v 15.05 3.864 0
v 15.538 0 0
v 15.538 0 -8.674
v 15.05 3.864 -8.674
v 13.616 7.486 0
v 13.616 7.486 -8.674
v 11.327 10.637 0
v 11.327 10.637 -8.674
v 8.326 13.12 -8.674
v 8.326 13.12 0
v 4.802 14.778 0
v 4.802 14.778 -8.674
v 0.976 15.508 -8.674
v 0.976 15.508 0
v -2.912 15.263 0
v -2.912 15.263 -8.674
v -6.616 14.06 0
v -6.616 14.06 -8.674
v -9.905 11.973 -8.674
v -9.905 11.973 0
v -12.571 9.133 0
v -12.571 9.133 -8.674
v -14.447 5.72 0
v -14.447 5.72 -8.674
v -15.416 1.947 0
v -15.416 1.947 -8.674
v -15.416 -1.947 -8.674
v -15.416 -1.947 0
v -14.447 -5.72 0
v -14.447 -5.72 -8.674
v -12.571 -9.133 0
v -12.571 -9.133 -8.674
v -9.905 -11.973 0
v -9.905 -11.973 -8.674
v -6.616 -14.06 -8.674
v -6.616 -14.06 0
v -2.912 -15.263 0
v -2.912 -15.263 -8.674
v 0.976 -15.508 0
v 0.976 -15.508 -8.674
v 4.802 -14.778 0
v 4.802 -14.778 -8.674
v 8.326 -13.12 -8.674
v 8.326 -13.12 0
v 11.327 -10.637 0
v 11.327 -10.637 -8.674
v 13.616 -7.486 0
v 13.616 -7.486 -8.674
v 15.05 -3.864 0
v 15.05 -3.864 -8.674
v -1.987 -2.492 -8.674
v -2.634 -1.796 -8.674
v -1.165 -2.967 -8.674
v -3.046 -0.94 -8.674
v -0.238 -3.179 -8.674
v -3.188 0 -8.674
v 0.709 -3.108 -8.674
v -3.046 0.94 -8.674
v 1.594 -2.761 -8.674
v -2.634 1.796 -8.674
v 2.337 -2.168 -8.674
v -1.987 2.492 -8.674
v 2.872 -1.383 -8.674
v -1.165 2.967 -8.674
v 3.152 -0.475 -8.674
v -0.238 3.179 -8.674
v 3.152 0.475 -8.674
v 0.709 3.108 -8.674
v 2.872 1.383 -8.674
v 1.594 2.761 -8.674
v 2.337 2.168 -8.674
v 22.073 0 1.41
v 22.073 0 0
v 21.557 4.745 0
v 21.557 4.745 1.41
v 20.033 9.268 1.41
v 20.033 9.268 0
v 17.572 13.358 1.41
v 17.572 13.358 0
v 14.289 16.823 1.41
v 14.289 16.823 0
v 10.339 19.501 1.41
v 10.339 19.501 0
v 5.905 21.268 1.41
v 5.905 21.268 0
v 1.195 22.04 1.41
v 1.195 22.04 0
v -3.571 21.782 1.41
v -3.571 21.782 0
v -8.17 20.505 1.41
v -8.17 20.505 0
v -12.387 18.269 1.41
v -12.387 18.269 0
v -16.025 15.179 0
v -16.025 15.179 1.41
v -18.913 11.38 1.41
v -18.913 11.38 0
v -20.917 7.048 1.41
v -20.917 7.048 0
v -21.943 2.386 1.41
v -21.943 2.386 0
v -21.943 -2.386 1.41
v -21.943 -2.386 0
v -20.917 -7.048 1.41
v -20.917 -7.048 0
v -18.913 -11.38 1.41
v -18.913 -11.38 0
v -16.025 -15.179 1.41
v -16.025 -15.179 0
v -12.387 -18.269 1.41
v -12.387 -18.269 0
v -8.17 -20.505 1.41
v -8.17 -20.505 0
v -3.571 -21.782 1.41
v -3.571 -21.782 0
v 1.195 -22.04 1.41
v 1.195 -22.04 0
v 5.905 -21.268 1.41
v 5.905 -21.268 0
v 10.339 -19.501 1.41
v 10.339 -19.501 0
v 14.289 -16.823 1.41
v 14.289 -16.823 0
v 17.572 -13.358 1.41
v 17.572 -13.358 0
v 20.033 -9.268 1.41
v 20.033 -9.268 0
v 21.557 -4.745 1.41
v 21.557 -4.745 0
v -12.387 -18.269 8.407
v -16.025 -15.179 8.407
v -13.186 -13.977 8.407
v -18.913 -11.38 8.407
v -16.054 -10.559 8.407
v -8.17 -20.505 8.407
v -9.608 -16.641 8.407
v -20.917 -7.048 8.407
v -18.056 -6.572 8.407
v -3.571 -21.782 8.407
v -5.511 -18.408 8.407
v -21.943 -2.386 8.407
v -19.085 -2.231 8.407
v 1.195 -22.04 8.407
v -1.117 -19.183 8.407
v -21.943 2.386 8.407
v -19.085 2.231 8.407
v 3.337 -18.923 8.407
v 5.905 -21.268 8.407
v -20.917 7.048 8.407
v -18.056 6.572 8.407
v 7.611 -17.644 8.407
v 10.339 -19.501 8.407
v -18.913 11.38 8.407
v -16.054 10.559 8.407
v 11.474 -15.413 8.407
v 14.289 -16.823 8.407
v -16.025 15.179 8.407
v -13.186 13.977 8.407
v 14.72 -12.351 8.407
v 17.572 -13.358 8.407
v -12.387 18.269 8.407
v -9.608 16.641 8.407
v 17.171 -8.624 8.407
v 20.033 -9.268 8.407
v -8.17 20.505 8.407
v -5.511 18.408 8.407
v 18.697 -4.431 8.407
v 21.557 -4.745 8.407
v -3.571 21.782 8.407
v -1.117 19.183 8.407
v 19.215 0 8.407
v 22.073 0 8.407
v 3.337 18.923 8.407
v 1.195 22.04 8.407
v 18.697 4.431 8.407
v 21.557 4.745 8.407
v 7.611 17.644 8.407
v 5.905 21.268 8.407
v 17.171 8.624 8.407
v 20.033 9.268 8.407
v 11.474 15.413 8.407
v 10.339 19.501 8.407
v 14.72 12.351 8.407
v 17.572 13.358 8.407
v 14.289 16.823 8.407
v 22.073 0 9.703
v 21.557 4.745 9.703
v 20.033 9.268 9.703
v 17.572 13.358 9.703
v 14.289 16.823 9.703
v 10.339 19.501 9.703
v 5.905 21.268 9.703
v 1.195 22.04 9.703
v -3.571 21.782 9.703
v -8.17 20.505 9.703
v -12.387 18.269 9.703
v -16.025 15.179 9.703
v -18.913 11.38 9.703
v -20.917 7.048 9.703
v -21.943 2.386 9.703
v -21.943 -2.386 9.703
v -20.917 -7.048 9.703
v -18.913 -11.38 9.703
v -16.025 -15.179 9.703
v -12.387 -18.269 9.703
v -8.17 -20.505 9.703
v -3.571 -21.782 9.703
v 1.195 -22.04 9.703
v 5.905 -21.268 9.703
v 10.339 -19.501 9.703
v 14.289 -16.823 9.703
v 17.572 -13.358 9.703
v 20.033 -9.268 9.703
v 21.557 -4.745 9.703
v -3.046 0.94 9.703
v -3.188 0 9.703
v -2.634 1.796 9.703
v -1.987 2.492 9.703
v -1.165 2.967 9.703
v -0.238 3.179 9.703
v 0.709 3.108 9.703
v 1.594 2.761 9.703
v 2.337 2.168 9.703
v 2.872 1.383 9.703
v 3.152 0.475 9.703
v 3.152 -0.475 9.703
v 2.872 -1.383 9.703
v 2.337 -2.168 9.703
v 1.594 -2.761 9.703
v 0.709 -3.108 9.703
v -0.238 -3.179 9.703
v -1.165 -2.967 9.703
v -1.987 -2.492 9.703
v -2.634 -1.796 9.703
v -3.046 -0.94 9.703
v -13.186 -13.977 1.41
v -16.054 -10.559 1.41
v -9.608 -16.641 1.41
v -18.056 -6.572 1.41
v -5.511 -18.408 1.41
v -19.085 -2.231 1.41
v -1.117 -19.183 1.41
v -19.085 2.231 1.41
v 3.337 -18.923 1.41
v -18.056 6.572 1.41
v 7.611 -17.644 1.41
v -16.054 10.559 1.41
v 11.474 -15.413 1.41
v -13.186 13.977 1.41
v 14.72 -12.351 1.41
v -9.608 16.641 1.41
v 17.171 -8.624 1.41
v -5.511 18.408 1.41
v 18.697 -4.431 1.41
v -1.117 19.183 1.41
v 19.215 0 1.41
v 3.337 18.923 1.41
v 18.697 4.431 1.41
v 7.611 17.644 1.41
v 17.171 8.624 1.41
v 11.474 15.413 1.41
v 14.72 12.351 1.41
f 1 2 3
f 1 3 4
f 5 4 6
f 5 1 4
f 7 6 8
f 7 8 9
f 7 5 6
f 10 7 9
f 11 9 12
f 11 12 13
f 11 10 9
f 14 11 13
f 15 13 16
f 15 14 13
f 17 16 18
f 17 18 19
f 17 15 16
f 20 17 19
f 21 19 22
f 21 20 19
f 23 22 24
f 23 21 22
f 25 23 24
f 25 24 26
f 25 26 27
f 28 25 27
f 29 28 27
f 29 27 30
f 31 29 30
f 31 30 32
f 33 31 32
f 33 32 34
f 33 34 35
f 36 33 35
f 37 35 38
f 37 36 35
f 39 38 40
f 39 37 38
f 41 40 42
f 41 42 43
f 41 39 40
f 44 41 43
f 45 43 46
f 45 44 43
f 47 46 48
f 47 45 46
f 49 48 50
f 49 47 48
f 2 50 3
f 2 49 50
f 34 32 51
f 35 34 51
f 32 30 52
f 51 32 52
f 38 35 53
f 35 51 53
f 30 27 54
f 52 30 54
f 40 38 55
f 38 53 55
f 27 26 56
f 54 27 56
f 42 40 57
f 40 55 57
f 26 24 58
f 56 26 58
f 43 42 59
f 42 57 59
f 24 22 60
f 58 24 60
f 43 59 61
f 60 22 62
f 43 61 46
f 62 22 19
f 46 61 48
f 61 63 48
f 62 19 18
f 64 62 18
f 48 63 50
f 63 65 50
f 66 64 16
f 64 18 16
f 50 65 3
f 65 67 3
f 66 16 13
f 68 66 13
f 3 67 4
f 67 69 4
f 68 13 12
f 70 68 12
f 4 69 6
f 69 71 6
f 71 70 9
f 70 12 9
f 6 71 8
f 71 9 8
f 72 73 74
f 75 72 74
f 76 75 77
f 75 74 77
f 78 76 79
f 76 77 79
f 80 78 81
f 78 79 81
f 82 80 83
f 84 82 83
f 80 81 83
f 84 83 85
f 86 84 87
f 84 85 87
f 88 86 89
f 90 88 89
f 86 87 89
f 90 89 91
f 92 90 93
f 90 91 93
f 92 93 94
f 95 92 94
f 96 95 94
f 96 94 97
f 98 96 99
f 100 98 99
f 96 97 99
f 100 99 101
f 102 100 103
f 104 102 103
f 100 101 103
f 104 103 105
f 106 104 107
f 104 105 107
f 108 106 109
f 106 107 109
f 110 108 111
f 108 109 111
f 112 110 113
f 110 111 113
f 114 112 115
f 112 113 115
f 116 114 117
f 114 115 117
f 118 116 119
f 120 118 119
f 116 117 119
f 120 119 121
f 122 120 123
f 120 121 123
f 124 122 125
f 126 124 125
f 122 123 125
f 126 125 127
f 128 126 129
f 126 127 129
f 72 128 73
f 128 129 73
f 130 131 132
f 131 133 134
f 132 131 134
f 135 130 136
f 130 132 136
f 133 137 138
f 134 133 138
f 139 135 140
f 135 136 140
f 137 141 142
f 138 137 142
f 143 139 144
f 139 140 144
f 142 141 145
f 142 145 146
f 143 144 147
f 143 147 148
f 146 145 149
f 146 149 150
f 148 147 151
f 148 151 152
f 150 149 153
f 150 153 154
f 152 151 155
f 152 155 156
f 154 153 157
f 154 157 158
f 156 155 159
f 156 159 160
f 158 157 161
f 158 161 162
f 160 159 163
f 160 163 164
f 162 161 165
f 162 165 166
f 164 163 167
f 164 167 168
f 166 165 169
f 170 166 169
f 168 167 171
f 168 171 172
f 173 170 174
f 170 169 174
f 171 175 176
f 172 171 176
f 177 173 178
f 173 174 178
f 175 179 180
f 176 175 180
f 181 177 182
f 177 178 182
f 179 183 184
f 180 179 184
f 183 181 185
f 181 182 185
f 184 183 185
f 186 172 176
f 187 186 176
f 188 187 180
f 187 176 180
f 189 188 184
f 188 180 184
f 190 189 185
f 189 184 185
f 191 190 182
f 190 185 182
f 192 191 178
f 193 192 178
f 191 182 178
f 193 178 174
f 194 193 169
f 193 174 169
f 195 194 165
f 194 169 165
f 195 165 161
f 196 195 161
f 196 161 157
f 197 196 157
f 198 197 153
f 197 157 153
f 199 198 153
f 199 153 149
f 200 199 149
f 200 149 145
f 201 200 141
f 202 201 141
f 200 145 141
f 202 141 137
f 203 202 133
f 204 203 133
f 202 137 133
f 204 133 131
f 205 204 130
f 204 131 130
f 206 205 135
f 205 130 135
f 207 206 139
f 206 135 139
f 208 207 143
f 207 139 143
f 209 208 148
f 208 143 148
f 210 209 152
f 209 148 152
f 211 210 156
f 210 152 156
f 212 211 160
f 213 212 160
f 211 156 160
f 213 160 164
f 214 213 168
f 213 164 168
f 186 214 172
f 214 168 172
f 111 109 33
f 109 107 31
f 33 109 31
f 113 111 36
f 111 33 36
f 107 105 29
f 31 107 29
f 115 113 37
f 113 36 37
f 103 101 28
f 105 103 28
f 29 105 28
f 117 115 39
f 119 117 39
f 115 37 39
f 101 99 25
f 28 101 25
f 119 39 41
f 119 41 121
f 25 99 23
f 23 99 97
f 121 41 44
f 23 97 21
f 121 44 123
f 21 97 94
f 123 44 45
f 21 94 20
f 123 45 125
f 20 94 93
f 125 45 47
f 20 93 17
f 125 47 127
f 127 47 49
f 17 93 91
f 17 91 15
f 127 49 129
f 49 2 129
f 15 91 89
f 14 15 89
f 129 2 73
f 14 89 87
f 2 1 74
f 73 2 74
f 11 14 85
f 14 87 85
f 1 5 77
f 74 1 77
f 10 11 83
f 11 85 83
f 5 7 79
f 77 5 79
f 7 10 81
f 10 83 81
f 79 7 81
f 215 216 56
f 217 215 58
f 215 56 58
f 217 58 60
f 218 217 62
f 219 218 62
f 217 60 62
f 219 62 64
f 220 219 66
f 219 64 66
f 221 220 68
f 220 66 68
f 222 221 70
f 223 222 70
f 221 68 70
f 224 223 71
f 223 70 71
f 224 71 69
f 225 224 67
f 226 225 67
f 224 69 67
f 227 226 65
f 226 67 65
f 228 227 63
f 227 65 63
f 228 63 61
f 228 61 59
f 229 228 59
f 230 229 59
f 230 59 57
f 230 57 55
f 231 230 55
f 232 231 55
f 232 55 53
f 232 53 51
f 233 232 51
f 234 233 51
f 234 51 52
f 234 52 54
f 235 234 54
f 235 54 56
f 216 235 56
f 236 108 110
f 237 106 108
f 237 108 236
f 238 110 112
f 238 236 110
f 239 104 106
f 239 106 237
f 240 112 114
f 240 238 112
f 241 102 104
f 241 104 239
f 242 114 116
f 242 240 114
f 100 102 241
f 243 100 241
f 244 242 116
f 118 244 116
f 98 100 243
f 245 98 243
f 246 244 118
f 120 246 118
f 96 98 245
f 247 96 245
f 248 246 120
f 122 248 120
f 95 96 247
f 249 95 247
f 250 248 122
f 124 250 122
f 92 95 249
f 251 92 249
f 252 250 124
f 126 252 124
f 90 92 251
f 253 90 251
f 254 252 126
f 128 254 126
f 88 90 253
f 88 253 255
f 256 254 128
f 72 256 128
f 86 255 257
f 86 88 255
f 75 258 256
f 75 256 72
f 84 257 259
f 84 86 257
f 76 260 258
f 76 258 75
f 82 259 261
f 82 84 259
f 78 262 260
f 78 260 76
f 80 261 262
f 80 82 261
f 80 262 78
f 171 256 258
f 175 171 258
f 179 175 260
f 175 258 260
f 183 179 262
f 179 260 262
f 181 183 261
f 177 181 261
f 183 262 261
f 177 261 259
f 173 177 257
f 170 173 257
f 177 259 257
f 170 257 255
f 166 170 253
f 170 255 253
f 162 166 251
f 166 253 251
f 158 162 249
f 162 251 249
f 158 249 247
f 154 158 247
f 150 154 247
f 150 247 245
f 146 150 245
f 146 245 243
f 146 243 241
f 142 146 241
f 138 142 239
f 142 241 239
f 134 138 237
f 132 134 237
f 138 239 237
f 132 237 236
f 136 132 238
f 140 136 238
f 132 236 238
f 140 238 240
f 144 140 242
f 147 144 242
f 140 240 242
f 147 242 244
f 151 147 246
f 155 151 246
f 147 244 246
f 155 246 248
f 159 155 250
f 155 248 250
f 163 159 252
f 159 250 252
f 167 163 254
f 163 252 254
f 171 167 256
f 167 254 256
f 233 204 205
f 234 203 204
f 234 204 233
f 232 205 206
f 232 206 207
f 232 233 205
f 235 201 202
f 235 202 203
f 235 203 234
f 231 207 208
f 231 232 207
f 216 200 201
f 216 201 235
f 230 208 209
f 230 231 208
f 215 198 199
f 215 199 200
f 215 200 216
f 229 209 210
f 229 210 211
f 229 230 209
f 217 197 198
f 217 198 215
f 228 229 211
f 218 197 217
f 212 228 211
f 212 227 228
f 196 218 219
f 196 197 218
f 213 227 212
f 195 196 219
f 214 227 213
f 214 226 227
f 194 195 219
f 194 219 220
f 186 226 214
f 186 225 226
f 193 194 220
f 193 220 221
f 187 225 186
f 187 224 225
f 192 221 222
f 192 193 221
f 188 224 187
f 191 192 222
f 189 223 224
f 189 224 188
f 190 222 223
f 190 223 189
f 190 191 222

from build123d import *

# Parameters (mm, degrees)
SKETCH1_R           = 15.53845
BOSS_EXTRUDE1_DEPTH = 8.6741
SKETCH2_R           = 22.0726
BOSS_EXTRUDE2_DEPTH = 1.4097
SKETCH3_R           = 19.2151
BOSS_EXTRUDE3_DEPTH = 6.9977
BOSS_EXTRUDE5_START = 8.4074
SKETCH2_3_R         = 22.0726
BOSS_EXTRUDE5_DEPTH = 1.2954
SKETCH5_R           = 3.1877
CUT_EXTRUDE1_DEPTH  = 37.223056126


with BuildPart() as part:
    # Sketch1 → Boss-Extrude1 (new body)
    with BuildSketch(Plane.XY):
        Circle(SKETCH1_R)
    extrude(amount=-BOSS_EXTRUDE1_DEPTH)

    # Sketch2 → Boss-Extrude2 (add)
    with BuildSketch(Plane.XY):
        Circle(SKETCH2_R)
    extrude(amount=BOSS_EXTRUDE2_DEPTH)

    # Sketch3 → Boss-Extrude3 (add)
    with BuildSketch(Plane.XY.offset(1.4097)):
        Circle(SKETCH3_R)
    extrude(amount=BOSS_EXTRUDE3_DEPTH)

    # Sketch2<3> → Boss-Extrude5 (add)
    with BuildSketch(Plane.XY.offset(BOSS_EXTRUDE5_START)):
        Circle(SKETCH2_3_R)
    extrude(amount=BOSS_EXTRUDE5_DEPTH)

    # Sketch5 → Cut-Extrude1 (cut, through all)
    with BuildSketch(Plane(origin=(0, 0, -8.6741), x_dir=(-1, 0, 0), z_dir=(0, 0, -1))):
        Circle(SKETCH5_R)
    extrude(amount=-CUT_EXTRUDE1_DEPTH, mode=Mode.SUBTRACT)


solid = part.part
